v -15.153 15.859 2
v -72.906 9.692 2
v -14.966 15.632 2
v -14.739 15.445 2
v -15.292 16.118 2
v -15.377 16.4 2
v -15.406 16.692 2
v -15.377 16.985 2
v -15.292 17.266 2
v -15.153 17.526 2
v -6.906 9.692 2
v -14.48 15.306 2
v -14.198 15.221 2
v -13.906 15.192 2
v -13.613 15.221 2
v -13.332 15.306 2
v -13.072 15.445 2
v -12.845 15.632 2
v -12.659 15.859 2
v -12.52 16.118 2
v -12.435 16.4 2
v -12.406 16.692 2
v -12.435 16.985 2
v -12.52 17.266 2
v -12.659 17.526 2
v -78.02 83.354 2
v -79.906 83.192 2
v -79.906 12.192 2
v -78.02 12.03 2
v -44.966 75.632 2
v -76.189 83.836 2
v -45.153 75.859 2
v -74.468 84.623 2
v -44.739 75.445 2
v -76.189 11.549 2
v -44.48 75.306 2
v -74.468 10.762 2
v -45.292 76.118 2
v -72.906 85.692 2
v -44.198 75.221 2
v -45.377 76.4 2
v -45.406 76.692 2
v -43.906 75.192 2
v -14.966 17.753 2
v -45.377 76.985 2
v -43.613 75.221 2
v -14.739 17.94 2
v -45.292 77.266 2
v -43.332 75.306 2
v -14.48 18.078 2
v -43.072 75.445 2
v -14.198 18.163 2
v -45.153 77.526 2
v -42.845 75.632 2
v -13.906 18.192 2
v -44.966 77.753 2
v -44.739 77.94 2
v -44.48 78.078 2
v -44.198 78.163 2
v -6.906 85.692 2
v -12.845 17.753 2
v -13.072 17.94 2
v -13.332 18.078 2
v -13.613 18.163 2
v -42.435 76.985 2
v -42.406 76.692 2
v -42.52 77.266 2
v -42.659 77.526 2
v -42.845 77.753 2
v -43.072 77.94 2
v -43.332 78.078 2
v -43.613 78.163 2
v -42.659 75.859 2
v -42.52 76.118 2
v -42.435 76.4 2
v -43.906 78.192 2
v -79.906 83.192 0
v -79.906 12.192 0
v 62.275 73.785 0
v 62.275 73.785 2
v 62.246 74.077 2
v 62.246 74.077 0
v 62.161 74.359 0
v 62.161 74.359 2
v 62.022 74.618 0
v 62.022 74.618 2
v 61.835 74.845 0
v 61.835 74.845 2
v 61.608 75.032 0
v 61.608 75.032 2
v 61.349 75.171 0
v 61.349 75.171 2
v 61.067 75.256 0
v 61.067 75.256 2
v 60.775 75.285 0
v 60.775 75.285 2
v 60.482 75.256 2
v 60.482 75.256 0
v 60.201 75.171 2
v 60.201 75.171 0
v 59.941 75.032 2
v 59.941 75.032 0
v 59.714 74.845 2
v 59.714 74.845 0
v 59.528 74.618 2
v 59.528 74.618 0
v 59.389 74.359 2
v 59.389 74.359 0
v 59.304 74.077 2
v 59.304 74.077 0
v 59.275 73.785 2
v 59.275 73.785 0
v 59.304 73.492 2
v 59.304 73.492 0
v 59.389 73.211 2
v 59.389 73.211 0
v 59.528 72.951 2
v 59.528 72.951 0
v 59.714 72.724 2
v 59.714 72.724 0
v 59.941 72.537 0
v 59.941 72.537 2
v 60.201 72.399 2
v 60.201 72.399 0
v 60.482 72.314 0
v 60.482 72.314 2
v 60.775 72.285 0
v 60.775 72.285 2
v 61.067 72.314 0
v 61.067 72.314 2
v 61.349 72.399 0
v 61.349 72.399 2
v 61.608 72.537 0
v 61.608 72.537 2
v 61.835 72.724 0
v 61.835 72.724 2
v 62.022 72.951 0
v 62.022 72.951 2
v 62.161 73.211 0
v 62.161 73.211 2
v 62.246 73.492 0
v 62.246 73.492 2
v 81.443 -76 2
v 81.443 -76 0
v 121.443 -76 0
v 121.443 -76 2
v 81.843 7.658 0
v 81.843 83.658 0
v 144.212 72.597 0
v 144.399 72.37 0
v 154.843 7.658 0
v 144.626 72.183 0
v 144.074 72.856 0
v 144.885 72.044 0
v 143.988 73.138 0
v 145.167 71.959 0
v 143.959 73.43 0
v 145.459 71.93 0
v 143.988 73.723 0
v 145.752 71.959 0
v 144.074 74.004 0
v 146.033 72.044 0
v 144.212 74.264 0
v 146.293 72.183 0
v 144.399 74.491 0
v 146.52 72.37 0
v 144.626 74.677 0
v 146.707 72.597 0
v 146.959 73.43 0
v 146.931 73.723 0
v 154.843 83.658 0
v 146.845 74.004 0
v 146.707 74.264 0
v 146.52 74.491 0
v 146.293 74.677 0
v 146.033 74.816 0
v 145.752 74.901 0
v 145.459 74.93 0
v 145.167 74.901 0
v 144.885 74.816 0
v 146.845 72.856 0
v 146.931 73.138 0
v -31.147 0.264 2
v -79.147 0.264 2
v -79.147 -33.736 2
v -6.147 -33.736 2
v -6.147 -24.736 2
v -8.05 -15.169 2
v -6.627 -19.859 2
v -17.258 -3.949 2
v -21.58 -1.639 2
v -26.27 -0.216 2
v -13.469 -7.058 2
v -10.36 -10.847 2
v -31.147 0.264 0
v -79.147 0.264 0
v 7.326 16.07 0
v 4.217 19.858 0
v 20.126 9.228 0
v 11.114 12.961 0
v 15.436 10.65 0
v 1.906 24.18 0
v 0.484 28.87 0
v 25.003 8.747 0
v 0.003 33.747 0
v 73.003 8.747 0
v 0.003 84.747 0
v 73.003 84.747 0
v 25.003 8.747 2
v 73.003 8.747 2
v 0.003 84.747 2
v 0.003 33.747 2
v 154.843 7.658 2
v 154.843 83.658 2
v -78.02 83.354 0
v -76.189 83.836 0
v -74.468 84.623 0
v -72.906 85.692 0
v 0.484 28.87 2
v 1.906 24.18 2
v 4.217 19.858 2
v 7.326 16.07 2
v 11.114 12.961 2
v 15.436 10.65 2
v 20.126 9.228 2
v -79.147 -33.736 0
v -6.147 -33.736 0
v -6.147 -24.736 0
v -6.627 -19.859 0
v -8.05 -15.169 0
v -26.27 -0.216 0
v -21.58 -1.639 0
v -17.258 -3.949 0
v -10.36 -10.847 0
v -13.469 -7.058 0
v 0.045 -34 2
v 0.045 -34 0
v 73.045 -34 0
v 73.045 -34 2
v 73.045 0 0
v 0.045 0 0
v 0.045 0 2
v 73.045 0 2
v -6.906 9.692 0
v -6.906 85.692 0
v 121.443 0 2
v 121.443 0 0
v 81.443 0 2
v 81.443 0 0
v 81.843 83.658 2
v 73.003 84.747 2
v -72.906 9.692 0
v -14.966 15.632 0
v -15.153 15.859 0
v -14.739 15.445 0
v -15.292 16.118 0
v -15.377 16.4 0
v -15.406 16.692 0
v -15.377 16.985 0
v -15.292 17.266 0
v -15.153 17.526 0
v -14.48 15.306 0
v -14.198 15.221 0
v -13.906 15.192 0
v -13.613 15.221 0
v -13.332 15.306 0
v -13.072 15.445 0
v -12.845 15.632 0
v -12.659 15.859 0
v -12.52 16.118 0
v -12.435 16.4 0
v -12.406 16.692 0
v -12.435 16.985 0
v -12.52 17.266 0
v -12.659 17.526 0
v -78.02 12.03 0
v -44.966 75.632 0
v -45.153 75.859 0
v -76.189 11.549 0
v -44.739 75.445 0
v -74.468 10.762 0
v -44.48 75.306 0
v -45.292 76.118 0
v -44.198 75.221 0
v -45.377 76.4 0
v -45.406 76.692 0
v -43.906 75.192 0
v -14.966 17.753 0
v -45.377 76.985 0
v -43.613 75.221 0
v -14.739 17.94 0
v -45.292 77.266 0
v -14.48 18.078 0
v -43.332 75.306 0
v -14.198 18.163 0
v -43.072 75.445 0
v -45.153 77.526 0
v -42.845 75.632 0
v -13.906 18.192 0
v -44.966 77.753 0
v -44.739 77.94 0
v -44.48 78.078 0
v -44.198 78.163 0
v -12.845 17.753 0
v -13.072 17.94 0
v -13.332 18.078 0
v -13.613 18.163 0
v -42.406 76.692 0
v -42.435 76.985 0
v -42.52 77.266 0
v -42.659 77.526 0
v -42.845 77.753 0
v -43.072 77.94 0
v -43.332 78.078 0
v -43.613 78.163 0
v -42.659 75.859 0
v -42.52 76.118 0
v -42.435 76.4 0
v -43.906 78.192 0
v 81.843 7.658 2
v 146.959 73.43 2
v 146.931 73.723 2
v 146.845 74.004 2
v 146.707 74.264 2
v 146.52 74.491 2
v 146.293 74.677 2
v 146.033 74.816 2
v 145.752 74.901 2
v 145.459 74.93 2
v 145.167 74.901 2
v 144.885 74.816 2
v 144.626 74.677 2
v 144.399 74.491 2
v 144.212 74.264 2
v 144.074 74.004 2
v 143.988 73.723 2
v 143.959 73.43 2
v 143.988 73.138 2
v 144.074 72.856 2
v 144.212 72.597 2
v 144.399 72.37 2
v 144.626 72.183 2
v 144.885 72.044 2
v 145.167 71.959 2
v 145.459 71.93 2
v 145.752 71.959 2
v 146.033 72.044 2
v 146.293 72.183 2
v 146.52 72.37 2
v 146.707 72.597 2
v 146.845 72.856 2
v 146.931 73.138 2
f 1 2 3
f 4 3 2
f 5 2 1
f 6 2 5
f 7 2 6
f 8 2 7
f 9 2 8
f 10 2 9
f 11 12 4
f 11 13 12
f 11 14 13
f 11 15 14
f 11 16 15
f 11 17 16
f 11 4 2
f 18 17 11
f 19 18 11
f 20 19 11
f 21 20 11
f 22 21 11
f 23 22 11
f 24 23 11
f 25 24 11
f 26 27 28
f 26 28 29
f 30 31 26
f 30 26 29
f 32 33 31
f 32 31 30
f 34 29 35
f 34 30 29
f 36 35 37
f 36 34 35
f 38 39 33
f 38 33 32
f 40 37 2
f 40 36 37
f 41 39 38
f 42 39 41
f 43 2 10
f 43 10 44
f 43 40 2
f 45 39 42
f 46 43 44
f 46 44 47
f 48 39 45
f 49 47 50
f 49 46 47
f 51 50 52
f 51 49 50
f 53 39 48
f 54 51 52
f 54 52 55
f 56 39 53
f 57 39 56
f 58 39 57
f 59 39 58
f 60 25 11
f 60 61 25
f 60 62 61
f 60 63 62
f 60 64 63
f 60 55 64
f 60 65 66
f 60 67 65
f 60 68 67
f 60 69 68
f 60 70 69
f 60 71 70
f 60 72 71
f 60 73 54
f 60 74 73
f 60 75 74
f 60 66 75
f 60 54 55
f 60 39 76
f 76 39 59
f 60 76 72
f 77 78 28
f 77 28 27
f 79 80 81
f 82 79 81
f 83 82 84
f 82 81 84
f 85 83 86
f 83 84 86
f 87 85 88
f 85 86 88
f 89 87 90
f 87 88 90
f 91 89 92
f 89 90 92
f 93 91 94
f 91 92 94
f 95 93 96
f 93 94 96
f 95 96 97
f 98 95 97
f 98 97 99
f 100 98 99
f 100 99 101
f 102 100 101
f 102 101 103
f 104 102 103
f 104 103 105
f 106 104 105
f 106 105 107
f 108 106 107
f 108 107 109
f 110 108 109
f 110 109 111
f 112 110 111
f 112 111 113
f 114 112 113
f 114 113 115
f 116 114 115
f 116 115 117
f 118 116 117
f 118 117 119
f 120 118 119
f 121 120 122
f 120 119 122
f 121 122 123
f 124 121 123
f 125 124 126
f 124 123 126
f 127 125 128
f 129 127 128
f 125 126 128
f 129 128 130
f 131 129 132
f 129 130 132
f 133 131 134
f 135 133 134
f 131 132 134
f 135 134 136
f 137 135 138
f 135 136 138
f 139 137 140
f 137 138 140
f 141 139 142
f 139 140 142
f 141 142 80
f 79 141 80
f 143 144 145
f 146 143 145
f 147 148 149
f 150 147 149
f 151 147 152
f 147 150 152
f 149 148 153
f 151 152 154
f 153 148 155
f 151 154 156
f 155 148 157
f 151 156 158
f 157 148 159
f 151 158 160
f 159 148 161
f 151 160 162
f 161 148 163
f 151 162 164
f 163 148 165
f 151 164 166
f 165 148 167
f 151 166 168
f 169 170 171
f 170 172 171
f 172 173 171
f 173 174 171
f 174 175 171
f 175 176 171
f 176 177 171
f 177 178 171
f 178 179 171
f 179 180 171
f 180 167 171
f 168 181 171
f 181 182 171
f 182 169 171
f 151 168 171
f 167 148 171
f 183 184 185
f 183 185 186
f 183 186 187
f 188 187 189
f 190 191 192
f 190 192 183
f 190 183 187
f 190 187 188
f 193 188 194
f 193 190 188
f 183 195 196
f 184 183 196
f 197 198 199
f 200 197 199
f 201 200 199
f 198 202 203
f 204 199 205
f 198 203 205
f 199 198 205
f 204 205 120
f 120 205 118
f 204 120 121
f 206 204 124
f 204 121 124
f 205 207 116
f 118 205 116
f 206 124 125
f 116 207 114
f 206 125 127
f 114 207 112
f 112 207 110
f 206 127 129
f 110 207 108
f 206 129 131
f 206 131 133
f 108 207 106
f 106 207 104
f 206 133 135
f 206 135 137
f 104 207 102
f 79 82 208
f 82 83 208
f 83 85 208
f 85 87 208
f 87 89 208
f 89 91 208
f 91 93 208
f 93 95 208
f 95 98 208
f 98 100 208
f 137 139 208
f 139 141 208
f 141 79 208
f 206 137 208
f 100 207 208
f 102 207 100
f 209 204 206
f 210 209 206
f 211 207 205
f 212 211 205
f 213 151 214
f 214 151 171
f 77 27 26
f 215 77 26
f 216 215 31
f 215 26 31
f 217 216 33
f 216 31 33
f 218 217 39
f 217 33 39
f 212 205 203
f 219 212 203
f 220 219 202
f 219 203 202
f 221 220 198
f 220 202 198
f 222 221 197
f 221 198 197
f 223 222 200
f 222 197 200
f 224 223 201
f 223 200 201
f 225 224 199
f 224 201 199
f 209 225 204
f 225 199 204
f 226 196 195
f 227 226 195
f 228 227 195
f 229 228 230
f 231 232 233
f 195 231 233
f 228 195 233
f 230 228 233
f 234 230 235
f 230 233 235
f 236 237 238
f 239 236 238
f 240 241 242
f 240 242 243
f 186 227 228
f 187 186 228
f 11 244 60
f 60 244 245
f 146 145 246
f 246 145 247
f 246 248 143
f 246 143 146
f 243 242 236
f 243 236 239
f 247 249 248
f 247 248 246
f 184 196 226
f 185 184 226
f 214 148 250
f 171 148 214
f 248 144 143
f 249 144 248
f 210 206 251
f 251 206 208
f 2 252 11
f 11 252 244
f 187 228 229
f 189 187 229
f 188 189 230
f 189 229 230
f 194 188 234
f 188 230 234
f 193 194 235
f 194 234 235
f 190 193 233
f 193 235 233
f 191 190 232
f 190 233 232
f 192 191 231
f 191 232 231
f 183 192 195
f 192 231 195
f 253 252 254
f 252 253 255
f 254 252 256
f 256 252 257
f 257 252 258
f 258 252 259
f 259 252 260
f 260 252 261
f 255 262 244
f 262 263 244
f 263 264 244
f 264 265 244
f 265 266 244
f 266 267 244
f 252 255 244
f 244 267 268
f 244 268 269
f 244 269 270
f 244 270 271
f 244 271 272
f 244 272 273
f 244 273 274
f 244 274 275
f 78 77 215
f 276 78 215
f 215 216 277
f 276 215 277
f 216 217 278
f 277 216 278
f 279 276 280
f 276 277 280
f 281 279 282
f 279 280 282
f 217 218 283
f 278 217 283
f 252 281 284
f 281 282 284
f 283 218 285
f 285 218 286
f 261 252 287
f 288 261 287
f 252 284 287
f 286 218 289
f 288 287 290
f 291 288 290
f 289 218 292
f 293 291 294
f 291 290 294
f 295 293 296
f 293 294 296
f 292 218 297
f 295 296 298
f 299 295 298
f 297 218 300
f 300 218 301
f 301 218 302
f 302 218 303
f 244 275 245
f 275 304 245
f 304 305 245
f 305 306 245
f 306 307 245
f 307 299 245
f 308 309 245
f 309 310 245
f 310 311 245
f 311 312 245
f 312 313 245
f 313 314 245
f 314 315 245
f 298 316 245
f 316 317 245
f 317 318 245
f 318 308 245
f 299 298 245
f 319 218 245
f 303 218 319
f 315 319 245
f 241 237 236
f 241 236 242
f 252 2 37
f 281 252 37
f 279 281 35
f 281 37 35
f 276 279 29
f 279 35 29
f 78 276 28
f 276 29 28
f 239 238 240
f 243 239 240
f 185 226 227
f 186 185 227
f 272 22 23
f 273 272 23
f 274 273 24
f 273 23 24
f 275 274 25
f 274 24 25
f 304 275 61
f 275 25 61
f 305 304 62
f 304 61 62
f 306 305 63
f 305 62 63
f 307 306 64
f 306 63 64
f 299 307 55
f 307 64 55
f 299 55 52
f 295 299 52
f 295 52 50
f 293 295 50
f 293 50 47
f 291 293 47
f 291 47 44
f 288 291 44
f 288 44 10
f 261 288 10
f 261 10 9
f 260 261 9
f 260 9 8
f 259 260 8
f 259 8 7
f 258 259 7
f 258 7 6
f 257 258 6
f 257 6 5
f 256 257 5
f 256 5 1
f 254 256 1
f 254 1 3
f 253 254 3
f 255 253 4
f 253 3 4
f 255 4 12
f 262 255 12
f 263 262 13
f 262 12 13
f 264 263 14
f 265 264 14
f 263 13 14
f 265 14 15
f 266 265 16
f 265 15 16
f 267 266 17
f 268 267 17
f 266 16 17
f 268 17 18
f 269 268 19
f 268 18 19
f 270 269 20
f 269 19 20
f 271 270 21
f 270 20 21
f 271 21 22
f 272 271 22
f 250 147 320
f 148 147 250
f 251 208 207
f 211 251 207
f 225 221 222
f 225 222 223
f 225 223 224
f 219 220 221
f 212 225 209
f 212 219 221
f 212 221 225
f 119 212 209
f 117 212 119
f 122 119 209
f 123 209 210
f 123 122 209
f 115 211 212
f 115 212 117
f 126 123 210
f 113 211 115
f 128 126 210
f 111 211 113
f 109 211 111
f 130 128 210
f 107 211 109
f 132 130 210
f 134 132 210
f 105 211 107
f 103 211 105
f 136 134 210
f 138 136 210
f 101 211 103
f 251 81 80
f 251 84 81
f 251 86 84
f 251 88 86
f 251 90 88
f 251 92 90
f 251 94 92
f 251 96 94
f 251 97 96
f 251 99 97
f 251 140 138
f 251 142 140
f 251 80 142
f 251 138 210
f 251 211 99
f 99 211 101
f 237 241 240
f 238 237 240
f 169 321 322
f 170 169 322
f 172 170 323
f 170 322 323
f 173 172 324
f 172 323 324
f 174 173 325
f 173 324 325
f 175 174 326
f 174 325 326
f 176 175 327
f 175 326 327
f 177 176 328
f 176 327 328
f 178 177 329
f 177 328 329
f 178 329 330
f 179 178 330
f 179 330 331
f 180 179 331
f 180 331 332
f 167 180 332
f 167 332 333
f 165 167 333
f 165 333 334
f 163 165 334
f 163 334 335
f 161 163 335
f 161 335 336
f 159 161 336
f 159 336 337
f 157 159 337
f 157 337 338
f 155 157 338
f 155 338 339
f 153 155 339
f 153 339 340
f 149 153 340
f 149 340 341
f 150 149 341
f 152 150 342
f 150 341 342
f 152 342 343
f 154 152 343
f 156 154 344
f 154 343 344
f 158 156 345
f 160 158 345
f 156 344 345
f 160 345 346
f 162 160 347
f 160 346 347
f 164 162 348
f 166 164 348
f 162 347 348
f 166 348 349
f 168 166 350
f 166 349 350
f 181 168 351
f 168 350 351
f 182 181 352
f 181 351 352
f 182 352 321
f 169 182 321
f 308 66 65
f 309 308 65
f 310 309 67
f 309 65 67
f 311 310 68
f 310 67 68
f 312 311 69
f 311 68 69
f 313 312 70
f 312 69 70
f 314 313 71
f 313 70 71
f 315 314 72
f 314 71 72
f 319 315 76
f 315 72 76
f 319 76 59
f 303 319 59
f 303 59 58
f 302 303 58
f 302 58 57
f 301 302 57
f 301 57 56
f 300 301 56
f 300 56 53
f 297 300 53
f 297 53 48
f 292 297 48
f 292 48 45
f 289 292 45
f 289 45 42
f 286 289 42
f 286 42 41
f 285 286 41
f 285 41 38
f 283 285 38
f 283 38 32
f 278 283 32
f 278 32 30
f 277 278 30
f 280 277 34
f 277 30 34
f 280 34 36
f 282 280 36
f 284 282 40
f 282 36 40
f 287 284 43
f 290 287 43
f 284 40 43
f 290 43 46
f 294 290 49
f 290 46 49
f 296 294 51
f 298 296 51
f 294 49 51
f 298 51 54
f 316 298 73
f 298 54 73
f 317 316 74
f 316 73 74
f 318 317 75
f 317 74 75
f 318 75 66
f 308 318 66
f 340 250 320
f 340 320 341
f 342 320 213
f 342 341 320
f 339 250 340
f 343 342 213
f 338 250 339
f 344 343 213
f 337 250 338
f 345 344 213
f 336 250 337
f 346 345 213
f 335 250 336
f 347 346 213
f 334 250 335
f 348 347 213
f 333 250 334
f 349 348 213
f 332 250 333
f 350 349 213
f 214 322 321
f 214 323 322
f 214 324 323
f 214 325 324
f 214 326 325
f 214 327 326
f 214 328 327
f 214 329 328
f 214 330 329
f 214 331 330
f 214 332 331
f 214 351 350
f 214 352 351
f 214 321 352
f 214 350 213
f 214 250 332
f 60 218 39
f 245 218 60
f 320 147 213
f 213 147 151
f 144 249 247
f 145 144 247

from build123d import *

# Parameters (mm, degrees)
F0_W      = 73
F0_H      = 76
F1_DEPTH  = 2
F3_DEPTH  = 2
F5_DEPTH  = 2
F6_W      = 73
F6_H      = 34
F7_DEPTH  = 2
F8_W      = 73
F8_H      = 76
F9_DEPTH  = 2
F10_W     = 40
F10_H     = 76
F11_DEPTH = 2
F13_R     = 1.5
F14_DEPTH = 3
F16_DEPTH = 25


with BuildPart() as f1:
    # F0 (on Top) → F1 (new body)
    with BuildSketch(Plane.XY):
        with Locations((-43.4057699293, 47.692308493)):
            Rectangle(F0_W, F0_H)
    extrude(amount=F1_DEPTH)


with BuildPart() as f3:
    # F2 (on Top) → F3 (new body)
    with BuildSketch(Plane.XY):
        with BuildLine():
            Line((73.003411293, 84.7474151826), (0.003411293, 84.7474151826))
            Line((0.003411293, 84.7474151826), (0.003411293, 33.7474151826))
            ThreePointArc((0.003411293, 33.7474151826), (7.3257417634, 16.069745653), (25.003411293, 8.7474151826))
            Line((25.003411293, 8.7474151826), (73.003411293, 8.7474151826))
            Line((73.003411293, 8.7474151826), (73.003411293, 84.7474151826))
        make_face()
    extrude(amount=F3_DEPTH)


with BuildPart() as f5:
    # F4 (on Top) → F5 (new body)
    with BuildSketch(Plane.XY):
        with BuildLine():
            Line((-31.1469516055, 0.2639060989), (-79.1469516055, 0.2639060989))
            Line((-79.1469516055, 0.2639060989), (-79.1469516055, -33.7360939011))
            Line((-79.1469516055, -33.7360939011), (-6.1469516055, -33.7360939011))
            Line((-6.1469516055, -33.7360939011), (-6.1469516055, -24.7360939011))
            ThreePointArc((-6.1469516055, -24.7360939011), (-13.4692820759, -7.0584243714), (-31.1469516055, 0.2639060989))
        make_face()
    extrude(amount=F5_DEPTH)


with BuildPart() as f7:
    # F6 (on Top) → F7 (new body)
    with BuildSketch(Plane.XY):
        with Locations((36.5447524944, -17)):
            Rectangle(F6_W, F6_H)
    extrude(amount=F7_DEPTH)


with BuildPart() as f9:
    # F8 (on Top) → F9 (new body)
    with BuildSketch(Plane.XY):
        with Locations((118.3430621624, 45.6581593603)):
            Rectangle(F8_W, F8_H)
    extrude(amount=F9_DEPTH)


with BuildPart() as f11:
    # F10 (on Top) → F11 (new body)
    with BuildSketch(Plane.XY):
        with Locations((101.4428705918, -38)):
            Rectangle(F10_W, F10_H)
    extrude(amount=F11_DEPTH)


with BuildPart() as f11b:
    # F10 (on Top) → F11, piece 2 (new body)
    with BuildSketch(Plane.XY):
        with Locations((148.2472270727, -38.0005940096)):
            Rectangle(F10_W, F10_H)
    extrude(amount=F11_DEPTH)


with BuildPart() as f14_tool:
    # F13 (on face) → F14 (new body)
    with BuildSketch(Plane.XY.offset(2)):
        with Locations((60.7747882605, 73.784686625)):
            Circle(F13_R)
        with Locations((145.4593382223, 73.4302078024)):
            Circle(F13_R)
        with Locations((-13.9057699293, 16.692308493)):
            Circle(F13_R)
        with Locations((-43.9057699293, 76.692308493)):
            Circle(F13_R)
    extrude(amount=-F14_DEPTH)


with BuildPart() as f1_1:
    add(f1.part)

    # F14: cut by f14_tool
    add(f14_tool.part, mode=Mode.SUBTRACT)

    # F15 (on face) → F16 (cut)
    with BuildSketch(Plane.XY.offset(2)):
        with BuildLine():
            Line((-72.9057699293, 85.692308493), (-79.9057699293, 85.692308493))
            Line((-79.9057699293, 85.692308493), (-79.9057699293, 83.192308493))
            ThreePointArc((-79.9057699293, 83.192308493), (-76.1892527425, 83.8360603698), (-72.9057699293, 85.692308493))
        make_face()
        with BuildLine():
            ThreePointArc((-72.9057699293, 9.692308493), (-76.1892527425, 11.5485566161), (-79.9057699293, 12.192308493))
            Line((-79.9057699293, 12.192308493), (-79.9057699293, 9.692308493))
            Line((-79.9057699293, 9.692308493), (-72.9057699293, 9.692308493))
        make_face()
    extrude(amount=-F16_DEPTH, mode=Mode.SUBTRACT)


with BuildPart() as f3_1:
    add(f3.part)

    # F14: cut by f14_tool
    add(f14_tool.part, mode=Mode.SUBTRACT)


with BuildPart() as f9_1:
    add(f9.part)

    # F14: cut by f14_tool
    add(f14_tool.part, mode=Mode.SUBTRACT)


solid = Compound([f5.part, f7.part, f11.part, f1_1.part, f3_1.part, f9_1.part])
